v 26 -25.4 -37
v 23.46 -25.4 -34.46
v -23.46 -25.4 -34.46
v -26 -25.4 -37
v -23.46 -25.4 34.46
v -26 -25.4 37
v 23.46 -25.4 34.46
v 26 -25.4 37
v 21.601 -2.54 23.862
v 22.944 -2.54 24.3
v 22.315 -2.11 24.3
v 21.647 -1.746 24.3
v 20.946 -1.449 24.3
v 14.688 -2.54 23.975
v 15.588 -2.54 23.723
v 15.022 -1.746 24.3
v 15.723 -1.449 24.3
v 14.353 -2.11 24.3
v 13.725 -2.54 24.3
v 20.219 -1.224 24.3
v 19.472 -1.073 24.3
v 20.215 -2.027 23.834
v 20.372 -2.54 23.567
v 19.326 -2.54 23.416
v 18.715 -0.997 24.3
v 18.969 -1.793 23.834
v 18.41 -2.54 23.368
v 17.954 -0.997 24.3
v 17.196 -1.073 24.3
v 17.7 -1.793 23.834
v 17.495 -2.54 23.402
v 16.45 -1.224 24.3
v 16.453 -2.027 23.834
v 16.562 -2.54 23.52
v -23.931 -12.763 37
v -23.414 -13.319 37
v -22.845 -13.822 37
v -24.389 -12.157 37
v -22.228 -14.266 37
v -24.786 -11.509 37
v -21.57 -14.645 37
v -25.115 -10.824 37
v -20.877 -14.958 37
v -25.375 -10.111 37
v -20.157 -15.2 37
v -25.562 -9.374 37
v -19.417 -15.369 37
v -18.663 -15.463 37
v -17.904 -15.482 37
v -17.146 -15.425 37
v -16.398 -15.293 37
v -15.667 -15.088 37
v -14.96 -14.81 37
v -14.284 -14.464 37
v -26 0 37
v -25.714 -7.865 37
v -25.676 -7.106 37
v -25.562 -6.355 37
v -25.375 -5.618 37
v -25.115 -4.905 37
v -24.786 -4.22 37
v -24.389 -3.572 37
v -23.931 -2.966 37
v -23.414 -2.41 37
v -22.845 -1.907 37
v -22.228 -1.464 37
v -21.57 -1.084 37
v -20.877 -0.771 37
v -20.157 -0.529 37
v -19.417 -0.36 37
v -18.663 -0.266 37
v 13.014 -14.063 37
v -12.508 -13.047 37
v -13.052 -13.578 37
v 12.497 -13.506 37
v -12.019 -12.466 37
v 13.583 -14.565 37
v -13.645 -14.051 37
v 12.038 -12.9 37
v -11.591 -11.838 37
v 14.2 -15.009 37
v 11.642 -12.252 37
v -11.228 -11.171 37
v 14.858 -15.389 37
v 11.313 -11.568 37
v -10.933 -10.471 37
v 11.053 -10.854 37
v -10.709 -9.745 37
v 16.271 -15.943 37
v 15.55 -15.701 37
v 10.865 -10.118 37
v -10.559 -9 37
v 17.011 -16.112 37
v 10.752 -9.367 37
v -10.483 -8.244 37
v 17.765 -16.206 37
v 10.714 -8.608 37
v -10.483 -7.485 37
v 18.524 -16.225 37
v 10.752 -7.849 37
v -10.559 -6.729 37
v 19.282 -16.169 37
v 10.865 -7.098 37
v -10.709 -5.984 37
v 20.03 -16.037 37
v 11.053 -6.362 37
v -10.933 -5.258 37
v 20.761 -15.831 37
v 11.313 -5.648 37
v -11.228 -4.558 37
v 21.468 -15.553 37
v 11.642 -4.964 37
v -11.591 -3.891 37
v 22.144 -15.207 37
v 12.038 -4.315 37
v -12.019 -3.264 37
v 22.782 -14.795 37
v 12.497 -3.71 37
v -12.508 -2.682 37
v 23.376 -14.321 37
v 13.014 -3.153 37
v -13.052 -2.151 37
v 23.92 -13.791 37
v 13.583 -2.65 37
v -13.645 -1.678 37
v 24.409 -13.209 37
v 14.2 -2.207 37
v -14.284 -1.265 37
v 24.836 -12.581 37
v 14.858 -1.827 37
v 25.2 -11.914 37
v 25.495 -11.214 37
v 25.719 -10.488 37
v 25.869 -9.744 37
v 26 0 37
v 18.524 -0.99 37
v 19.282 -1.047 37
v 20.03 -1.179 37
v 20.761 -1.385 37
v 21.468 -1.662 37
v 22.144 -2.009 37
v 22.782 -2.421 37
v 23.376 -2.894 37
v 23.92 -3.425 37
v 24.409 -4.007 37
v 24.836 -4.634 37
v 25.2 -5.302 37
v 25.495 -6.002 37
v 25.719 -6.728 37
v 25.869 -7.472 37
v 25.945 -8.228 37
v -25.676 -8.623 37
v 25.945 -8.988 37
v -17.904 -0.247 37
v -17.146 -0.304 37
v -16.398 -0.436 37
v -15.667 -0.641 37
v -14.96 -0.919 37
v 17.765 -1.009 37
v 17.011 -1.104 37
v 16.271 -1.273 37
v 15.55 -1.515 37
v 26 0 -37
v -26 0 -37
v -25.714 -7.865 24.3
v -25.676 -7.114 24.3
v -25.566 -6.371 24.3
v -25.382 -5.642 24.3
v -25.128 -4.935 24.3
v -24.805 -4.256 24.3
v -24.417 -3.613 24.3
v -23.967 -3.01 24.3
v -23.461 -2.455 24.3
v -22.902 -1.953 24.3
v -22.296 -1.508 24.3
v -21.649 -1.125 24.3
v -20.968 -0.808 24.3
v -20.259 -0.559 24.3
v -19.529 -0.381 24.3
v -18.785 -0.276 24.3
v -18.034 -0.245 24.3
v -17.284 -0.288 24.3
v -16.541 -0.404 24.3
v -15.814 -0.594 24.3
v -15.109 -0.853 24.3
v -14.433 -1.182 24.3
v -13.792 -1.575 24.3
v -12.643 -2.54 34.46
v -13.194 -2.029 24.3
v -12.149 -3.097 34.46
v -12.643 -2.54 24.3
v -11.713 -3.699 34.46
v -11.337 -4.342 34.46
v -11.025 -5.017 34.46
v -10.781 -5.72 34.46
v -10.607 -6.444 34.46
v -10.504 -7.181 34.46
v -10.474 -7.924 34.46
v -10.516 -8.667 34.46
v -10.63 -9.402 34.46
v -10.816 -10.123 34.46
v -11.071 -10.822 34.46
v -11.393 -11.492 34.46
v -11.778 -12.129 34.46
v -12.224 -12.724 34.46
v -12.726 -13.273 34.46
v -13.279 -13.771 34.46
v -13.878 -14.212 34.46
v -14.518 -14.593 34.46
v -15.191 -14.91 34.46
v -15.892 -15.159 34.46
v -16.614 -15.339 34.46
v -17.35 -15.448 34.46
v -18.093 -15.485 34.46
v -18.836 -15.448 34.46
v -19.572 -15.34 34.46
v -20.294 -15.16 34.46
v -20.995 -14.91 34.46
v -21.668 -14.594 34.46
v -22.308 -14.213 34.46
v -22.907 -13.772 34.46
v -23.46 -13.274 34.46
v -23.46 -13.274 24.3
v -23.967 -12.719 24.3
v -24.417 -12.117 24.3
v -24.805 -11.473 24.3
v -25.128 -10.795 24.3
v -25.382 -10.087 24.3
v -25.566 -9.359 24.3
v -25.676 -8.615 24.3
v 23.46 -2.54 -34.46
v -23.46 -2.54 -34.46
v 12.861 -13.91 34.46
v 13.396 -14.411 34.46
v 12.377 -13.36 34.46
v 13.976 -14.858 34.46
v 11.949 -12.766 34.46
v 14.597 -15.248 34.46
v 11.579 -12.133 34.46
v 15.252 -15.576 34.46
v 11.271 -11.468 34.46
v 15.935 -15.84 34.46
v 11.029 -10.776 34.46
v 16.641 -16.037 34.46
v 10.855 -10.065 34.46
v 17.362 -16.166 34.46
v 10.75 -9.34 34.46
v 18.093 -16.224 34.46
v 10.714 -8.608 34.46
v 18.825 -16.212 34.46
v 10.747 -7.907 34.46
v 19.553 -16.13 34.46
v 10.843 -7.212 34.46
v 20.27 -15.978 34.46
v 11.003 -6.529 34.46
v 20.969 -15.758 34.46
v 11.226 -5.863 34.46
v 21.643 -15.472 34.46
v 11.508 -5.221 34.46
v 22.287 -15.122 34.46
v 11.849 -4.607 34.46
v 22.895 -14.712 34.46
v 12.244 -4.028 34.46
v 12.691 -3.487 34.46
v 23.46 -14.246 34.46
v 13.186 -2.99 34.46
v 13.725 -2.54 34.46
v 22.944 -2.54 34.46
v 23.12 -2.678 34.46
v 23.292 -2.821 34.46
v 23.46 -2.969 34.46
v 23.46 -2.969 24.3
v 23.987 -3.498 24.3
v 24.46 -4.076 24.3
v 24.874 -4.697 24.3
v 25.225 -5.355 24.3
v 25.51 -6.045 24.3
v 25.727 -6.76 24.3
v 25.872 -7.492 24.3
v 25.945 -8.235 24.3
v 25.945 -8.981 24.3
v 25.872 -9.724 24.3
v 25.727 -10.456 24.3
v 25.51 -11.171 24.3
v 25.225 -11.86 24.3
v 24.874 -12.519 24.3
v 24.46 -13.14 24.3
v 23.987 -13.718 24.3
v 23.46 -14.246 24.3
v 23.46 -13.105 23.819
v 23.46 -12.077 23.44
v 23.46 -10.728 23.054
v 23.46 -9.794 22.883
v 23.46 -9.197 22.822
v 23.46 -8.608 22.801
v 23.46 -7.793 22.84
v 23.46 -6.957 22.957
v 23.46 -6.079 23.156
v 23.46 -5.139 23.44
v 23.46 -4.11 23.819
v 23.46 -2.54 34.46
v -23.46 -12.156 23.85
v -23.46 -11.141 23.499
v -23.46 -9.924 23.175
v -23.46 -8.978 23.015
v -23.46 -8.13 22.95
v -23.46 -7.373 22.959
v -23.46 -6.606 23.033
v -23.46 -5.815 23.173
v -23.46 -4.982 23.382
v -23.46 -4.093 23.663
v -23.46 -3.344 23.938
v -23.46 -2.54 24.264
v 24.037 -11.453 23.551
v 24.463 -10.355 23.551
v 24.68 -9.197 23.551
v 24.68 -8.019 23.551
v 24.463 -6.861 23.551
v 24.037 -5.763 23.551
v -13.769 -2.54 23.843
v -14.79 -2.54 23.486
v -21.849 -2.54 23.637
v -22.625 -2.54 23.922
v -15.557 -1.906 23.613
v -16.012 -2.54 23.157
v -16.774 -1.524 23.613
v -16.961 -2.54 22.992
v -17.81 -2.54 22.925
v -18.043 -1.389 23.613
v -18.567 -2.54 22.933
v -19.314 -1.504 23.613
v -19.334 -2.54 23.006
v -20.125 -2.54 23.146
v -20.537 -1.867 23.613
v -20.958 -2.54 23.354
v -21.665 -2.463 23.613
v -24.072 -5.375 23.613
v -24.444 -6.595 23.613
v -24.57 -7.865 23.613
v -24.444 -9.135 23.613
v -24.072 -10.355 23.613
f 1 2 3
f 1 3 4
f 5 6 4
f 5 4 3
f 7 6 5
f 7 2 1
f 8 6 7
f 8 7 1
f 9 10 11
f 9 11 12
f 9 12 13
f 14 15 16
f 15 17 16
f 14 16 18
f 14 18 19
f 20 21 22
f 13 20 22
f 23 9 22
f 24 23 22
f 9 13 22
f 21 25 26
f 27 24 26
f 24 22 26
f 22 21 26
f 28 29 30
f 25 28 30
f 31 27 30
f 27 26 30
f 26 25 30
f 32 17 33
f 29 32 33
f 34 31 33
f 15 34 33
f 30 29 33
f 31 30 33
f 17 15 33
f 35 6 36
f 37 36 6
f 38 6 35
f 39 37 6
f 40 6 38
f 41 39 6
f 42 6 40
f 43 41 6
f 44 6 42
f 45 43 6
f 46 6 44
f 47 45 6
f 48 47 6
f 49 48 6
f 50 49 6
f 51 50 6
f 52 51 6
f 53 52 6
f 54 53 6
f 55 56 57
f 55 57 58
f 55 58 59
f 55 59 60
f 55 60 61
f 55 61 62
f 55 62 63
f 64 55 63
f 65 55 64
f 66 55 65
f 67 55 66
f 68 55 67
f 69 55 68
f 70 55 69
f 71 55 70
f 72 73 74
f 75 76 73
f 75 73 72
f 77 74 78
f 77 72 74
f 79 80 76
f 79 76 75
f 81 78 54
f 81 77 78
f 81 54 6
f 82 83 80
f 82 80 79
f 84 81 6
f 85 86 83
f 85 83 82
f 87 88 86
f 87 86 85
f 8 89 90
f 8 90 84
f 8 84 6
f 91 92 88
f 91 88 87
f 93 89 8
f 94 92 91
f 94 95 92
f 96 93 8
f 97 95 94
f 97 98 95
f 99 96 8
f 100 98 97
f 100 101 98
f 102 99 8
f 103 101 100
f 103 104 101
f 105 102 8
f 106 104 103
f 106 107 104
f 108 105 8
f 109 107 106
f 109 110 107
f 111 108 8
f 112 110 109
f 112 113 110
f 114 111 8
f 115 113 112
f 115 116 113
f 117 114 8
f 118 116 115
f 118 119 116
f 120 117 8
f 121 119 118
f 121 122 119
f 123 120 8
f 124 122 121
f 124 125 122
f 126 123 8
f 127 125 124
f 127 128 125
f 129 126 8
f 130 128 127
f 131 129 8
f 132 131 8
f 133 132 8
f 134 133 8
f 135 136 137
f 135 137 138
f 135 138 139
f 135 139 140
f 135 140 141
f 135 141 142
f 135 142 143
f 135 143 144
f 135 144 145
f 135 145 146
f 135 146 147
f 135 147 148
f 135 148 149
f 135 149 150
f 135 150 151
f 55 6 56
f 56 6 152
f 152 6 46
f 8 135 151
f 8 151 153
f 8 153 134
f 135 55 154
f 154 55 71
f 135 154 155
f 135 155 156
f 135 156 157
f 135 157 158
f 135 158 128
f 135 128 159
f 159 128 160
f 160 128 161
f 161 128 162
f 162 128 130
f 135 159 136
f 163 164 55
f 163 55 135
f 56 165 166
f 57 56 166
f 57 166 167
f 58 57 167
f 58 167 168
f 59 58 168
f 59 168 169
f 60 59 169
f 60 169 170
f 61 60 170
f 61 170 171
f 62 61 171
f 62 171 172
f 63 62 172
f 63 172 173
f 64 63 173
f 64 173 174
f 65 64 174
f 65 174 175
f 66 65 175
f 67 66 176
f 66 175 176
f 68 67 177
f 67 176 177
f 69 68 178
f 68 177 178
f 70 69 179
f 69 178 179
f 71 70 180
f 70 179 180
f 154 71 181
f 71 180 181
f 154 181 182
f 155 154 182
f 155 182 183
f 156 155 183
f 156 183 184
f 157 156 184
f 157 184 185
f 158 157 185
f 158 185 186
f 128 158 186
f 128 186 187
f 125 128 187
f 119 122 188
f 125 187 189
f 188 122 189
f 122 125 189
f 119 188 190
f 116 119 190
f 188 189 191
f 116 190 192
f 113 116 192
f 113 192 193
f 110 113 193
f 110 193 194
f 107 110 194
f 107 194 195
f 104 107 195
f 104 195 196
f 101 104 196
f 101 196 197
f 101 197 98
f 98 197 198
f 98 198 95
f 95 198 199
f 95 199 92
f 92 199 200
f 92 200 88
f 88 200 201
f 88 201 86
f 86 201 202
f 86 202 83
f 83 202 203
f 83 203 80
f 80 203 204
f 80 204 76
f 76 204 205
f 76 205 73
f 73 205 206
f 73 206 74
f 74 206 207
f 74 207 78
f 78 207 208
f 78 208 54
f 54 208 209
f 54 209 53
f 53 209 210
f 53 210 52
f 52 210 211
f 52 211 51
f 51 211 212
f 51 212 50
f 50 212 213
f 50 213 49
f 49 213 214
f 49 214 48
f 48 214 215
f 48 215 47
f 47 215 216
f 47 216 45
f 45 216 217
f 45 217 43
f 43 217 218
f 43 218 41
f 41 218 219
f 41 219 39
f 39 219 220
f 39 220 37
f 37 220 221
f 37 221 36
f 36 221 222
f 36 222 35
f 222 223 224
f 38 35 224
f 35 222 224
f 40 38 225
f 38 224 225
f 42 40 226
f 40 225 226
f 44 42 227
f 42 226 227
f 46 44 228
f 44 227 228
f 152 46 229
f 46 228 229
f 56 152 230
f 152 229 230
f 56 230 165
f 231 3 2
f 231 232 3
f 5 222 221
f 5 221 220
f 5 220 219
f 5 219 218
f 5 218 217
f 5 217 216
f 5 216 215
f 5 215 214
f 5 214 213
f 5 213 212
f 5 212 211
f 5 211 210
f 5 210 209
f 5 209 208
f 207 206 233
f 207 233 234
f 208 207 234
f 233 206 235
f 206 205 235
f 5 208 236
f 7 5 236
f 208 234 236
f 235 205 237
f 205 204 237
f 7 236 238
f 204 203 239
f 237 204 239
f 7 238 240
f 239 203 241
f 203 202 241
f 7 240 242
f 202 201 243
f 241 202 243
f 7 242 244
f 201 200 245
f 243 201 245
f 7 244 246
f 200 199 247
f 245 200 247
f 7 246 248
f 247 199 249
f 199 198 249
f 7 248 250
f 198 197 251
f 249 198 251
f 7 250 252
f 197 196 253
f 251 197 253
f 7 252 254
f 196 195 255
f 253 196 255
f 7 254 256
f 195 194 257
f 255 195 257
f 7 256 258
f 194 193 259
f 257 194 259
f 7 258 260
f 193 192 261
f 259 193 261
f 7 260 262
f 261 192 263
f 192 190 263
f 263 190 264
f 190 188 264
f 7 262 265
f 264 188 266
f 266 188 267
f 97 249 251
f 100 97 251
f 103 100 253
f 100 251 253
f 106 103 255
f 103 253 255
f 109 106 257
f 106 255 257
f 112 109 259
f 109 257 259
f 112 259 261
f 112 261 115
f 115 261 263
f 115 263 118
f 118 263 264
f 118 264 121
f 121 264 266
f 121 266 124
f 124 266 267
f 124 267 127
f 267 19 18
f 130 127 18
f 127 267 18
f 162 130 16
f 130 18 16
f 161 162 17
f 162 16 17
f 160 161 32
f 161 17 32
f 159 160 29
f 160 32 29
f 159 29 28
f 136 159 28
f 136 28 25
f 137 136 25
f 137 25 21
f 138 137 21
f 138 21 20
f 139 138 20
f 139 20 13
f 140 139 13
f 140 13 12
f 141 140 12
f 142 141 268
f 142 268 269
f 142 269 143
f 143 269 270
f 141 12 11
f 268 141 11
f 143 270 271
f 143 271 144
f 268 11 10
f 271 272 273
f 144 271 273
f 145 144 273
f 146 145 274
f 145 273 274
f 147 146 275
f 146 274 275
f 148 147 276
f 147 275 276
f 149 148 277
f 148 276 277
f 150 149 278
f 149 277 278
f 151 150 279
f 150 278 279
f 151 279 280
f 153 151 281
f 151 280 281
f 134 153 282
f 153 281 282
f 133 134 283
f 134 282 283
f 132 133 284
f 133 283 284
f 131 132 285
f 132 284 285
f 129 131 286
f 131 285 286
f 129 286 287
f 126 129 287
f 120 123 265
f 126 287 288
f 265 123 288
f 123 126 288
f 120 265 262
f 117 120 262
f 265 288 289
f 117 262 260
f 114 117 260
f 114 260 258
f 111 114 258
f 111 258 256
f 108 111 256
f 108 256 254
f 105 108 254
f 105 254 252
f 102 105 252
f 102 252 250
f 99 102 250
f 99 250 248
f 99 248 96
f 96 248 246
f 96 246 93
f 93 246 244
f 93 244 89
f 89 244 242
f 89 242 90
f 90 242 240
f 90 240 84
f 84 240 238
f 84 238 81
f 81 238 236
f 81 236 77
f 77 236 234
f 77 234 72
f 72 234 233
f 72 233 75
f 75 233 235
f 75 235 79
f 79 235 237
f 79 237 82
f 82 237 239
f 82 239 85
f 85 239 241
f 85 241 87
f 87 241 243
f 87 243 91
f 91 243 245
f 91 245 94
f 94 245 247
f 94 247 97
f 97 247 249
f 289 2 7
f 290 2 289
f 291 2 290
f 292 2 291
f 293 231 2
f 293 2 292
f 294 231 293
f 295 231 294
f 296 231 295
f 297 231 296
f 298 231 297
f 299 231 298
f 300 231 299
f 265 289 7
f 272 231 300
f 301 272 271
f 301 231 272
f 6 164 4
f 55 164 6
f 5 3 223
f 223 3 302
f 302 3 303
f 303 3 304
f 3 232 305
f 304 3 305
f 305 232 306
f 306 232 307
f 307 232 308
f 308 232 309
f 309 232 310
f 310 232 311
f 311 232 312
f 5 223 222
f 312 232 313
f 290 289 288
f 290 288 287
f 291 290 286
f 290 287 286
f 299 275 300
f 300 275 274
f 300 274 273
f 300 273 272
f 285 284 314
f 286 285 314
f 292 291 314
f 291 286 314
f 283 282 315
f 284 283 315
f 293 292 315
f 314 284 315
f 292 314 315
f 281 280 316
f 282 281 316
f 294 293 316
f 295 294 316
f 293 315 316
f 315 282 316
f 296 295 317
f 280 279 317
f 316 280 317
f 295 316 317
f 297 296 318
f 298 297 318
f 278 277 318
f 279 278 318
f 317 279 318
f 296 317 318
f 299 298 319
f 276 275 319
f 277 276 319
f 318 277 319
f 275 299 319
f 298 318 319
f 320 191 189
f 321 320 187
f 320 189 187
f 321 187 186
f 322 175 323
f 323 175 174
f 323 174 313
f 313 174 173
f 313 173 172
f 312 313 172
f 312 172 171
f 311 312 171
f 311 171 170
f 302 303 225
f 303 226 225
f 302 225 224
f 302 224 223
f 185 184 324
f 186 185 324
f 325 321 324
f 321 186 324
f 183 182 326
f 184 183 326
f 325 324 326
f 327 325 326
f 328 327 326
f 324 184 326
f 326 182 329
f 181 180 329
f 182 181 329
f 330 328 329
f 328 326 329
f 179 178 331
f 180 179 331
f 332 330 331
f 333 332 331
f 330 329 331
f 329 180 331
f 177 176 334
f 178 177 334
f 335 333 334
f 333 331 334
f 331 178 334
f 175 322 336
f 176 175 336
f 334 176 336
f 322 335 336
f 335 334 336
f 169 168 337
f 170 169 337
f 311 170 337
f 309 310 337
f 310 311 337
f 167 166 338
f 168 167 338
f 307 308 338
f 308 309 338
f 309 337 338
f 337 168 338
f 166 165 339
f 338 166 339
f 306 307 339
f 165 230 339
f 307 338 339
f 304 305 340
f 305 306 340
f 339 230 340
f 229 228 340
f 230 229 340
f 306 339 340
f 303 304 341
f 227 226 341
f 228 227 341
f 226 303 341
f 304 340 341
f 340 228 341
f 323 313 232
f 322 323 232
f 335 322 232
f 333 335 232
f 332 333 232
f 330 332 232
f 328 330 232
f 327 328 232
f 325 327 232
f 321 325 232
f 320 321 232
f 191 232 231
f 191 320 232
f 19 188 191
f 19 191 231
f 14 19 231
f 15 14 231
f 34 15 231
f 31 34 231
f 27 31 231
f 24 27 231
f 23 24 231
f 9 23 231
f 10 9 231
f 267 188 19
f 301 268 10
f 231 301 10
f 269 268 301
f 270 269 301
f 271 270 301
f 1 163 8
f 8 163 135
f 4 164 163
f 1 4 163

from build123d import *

# Parameters (mm, degrees)
F0_W     = 52
F0_H     = 74
F1_DEPTH = 25.4
F2_T     = -2.54
F4_D     = 15.24
F4_DEPTH = 12.7
F4_TIP   = 4.578557917


with BuildPart() as f1:
    # F0 (on Front) → F1 (new body)
    with BuildSketch(Plane.XZ):
        Rectangle(F0_W, F0_H)
    extrude(amount=F1_DEPTH)

    # F2
    f2_openings = [f1.faces().sort_by_distance(p)[0] for p in [
        (0, -25.4, 0),
    ]]
    offset(amount=F2_T, openings=f2_openings)

    # F4
    with Locations(Plane.XY.offset(37)):
        with Locations((-18.0935505778, -7.8645283356), (18.3343663812, -8.6078010499)):
            Hole(F4_D / 2, depth=F4_DEPTH)
            with Locations((0, 0, -(F4_DEPTH + F4_TIP / 2))):  # 118° drill point
                Cone(0, F4_D / 2, F4_TIP, mode=Mode.SUBTRACT)


solid = f1.part
